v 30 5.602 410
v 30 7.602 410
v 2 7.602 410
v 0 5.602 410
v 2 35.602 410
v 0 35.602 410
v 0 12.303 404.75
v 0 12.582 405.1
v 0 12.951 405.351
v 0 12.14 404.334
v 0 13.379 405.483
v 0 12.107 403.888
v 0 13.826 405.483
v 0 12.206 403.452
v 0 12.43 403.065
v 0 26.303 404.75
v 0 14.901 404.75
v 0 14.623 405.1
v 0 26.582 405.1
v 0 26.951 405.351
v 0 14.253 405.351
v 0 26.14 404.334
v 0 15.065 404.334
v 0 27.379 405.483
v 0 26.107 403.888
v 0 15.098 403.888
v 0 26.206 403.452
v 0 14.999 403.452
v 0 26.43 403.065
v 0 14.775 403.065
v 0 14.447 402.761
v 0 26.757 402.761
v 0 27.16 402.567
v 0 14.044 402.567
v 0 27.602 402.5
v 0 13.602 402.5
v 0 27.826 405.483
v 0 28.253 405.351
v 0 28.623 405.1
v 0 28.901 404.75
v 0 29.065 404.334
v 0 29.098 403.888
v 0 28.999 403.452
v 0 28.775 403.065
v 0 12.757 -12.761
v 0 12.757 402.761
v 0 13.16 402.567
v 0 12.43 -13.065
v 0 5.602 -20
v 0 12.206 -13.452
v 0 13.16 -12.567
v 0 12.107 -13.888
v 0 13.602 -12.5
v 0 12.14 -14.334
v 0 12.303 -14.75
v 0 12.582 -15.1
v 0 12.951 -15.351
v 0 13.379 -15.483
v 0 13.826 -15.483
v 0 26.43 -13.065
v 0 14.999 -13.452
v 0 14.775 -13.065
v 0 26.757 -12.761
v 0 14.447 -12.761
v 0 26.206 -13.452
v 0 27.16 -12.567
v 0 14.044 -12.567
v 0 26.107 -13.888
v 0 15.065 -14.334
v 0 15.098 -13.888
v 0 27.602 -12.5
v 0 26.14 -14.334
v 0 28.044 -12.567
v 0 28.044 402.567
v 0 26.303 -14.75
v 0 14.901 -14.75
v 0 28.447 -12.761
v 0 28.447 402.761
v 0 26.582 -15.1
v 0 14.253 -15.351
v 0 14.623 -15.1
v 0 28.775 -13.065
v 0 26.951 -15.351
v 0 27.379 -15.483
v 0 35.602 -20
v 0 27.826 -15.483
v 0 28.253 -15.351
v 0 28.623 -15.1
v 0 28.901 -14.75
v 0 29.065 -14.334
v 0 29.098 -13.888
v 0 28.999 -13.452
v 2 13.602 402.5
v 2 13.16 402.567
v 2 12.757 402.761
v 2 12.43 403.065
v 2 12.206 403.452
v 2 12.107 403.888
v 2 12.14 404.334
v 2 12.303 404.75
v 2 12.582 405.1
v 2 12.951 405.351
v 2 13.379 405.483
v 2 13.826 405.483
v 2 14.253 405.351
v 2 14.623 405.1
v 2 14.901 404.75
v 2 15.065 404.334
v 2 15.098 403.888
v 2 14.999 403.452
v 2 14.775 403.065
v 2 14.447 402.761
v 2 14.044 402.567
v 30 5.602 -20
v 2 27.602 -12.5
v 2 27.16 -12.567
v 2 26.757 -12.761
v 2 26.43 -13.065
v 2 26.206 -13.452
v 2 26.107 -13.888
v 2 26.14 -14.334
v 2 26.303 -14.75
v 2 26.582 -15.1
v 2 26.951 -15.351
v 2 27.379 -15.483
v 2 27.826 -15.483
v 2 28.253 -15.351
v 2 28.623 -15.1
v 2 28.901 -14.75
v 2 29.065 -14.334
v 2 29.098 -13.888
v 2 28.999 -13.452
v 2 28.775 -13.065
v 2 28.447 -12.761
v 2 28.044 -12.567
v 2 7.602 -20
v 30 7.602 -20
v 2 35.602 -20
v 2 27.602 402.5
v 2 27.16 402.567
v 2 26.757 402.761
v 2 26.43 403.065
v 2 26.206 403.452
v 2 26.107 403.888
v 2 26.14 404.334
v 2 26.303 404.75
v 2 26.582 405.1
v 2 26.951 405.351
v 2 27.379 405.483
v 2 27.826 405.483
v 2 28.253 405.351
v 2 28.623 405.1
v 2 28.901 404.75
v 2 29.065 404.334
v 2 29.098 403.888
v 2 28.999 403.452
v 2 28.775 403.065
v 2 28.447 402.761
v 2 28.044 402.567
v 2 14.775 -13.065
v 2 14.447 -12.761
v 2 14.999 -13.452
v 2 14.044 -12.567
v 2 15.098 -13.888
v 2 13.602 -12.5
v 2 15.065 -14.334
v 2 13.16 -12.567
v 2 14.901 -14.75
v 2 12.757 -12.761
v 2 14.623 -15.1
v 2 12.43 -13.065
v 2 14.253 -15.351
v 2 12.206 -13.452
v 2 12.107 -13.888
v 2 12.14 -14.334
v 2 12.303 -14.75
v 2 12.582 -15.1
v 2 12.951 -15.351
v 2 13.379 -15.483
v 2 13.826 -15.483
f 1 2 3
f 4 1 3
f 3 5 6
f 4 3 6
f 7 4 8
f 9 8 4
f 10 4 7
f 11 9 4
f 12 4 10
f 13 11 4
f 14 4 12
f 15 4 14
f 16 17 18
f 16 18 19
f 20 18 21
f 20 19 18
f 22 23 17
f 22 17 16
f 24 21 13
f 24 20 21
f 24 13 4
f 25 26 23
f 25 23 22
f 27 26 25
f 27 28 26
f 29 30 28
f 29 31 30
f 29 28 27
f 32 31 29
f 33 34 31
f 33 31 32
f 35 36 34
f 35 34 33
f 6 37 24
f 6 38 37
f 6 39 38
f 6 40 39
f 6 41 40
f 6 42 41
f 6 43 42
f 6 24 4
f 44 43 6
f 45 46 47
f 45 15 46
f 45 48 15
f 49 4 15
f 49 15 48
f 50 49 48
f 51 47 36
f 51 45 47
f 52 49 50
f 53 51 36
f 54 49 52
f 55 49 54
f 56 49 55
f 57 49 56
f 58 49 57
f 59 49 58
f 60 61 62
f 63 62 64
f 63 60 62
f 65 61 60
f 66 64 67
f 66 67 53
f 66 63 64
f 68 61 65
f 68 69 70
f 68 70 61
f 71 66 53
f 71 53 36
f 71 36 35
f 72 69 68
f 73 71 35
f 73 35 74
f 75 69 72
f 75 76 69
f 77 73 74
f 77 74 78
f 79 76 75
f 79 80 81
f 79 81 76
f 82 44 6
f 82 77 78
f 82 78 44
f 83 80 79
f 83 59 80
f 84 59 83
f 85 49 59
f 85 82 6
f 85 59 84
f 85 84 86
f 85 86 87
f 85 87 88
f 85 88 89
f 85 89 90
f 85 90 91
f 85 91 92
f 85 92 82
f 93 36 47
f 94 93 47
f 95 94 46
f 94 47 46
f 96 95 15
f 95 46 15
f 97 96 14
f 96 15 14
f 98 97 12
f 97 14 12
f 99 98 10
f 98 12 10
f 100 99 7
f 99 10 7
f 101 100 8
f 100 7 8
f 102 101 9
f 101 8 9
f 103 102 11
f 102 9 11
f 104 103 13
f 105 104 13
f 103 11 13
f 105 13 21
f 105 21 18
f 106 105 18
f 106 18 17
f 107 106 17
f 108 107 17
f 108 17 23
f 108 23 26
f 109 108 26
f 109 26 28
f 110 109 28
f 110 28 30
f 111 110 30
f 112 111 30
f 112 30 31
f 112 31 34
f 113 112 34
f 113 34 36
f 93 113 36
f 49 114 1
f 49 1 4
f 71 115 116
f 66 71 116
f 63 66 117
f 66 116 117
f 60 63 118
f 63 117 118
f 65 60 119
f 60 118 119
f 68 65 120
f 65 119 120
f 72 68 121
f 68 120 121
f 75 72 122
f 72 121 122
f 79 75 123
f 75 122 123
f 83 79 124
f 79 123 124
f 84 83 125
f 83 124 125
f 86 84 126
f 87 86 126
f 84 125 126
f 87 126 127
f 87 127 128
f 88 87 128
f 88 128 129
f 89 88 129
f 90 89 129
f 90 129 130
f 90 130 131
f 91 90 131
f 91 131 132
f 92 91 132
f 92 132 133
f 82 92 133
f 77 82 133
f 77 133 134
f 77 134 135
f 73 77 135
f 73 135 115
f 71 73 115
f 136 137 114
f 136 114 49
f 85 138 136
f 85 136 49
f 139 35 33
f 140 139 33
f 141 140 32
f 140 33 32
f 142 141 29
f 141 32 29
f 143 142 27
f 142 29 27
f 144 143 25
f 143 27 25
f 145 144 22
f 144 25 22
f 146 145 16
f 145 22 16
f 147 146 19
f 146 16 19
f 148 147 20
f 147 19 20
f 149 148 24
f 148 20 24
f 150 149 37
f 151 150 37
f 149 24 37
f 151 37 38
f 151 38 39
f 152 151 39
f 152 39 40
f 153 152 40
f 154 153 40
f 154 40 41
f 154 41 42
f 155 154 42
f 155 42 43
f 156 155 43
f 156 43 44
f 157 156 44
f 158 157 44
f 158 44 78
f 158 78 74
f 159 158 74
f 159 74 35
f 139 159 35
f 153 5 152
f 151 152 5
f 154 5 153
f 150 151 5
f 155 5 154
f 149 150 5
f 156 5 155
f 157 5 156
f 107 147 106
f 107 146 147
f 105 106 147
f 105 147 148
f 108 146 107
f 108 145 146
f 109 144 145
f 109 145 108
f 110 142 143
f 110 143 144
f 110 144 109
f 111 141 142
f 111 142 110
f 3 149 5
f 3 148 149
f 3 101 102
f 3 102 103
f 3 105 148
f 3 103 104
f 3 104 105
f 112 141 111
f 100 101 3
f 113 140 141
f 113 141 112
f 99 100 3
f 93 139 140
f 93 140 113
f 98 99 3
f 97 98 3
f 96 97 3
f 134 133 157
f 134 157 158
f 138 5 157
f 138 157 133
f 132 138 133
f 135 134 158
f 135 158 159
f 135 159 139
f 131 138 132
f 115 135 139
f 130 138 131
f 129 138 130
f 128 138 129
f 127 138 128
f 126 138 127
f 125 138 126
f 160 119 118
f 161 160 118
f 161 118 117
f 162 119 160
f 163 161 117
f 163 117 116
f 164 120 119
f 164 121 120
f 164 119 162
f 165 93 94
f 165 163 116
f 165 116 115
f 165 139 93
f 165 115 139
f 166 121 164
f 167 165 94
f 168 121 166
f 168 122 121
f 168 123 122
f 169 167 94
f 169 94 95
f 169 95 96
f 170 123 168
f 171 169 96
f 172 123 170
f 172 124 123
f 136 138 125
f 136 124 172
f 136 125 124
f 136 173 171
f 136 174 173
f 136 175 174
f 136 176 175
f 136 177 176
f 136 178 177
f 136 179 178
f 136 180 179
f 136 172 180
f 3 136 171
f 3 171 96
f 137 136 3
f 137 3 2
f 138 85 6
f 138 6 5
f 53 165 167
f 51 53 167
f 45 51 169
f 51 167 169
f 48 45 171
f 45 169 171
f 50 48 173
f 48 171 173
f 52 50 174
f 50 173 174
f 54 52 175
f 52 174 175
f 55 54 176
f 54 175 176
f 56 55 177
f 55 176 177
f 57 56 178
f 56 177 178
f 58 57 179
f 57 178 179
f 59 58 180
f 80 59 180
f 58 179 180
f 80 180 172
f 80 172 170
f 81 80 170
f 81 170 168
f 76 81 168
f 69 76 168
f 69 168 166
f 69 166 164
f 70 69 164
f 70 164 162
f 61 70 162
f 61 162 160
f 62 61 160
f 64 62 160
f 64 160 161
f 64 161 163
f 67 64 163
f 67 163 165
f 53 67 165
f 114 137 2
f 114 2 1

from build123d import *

# Parameters (mm, degrees)
BOSS_EXTRUDE1_DEPTH      = 410
BOSS_EXTRUDE1_DEPTH_BACK = 20
F_3_0_3_DIAMETER_HOLE2_D = 3
F_3_0_3_DIAMETER_HOLE4_D = 3


with BuildPart() as part:
    # Sketch1 → Boss-Extrude1 (new, two sides: drawn at the far end of the back side and taken through both)
    with BuildSketch(Plane.XY.offset(-BOSS_EXTRUDE1_DEPTH_BACK)):
        Polygon((0, 5.602318429), (0, 35.602318429), (2, 35.602318429), (2, 7.602318429), (30, 7.602318429), (30, 5.602318429), align=None)
    extrude(amount=BOSS_EXTRUDE1_DEPTH + BOSS_EXTRUDE1_DEPTH_BACK)

    # Ø3.0 (3) Diameter Hole2 (through all)
    with Locations(Plane(origin=(0, 369.009951222, 221.32004832), x_dir=(0, 0, -1), z_dir=(-1, 0, 0))):
        with Locations((235.32004832, 341.407632793), (235.32004832, 355.407632793)):
            Hole(F_3_0_3_DIAMETER_HOLE2_D / 2)

    # Ø3.0 (3) Diameter Hole4 (through all)
    with Locations(Plane(origin=(2, 369.009951222, 221.32004832), x_dir=(0, 0, 1), z_dir=(1, 0, 0))):
        with Locations((182.67995168, 355.407632793), (182.67995168, 341.407632793)):
            Hole(F_3_0_3_DIAMETER_HOLE4_D / 2)


solid = part.part
